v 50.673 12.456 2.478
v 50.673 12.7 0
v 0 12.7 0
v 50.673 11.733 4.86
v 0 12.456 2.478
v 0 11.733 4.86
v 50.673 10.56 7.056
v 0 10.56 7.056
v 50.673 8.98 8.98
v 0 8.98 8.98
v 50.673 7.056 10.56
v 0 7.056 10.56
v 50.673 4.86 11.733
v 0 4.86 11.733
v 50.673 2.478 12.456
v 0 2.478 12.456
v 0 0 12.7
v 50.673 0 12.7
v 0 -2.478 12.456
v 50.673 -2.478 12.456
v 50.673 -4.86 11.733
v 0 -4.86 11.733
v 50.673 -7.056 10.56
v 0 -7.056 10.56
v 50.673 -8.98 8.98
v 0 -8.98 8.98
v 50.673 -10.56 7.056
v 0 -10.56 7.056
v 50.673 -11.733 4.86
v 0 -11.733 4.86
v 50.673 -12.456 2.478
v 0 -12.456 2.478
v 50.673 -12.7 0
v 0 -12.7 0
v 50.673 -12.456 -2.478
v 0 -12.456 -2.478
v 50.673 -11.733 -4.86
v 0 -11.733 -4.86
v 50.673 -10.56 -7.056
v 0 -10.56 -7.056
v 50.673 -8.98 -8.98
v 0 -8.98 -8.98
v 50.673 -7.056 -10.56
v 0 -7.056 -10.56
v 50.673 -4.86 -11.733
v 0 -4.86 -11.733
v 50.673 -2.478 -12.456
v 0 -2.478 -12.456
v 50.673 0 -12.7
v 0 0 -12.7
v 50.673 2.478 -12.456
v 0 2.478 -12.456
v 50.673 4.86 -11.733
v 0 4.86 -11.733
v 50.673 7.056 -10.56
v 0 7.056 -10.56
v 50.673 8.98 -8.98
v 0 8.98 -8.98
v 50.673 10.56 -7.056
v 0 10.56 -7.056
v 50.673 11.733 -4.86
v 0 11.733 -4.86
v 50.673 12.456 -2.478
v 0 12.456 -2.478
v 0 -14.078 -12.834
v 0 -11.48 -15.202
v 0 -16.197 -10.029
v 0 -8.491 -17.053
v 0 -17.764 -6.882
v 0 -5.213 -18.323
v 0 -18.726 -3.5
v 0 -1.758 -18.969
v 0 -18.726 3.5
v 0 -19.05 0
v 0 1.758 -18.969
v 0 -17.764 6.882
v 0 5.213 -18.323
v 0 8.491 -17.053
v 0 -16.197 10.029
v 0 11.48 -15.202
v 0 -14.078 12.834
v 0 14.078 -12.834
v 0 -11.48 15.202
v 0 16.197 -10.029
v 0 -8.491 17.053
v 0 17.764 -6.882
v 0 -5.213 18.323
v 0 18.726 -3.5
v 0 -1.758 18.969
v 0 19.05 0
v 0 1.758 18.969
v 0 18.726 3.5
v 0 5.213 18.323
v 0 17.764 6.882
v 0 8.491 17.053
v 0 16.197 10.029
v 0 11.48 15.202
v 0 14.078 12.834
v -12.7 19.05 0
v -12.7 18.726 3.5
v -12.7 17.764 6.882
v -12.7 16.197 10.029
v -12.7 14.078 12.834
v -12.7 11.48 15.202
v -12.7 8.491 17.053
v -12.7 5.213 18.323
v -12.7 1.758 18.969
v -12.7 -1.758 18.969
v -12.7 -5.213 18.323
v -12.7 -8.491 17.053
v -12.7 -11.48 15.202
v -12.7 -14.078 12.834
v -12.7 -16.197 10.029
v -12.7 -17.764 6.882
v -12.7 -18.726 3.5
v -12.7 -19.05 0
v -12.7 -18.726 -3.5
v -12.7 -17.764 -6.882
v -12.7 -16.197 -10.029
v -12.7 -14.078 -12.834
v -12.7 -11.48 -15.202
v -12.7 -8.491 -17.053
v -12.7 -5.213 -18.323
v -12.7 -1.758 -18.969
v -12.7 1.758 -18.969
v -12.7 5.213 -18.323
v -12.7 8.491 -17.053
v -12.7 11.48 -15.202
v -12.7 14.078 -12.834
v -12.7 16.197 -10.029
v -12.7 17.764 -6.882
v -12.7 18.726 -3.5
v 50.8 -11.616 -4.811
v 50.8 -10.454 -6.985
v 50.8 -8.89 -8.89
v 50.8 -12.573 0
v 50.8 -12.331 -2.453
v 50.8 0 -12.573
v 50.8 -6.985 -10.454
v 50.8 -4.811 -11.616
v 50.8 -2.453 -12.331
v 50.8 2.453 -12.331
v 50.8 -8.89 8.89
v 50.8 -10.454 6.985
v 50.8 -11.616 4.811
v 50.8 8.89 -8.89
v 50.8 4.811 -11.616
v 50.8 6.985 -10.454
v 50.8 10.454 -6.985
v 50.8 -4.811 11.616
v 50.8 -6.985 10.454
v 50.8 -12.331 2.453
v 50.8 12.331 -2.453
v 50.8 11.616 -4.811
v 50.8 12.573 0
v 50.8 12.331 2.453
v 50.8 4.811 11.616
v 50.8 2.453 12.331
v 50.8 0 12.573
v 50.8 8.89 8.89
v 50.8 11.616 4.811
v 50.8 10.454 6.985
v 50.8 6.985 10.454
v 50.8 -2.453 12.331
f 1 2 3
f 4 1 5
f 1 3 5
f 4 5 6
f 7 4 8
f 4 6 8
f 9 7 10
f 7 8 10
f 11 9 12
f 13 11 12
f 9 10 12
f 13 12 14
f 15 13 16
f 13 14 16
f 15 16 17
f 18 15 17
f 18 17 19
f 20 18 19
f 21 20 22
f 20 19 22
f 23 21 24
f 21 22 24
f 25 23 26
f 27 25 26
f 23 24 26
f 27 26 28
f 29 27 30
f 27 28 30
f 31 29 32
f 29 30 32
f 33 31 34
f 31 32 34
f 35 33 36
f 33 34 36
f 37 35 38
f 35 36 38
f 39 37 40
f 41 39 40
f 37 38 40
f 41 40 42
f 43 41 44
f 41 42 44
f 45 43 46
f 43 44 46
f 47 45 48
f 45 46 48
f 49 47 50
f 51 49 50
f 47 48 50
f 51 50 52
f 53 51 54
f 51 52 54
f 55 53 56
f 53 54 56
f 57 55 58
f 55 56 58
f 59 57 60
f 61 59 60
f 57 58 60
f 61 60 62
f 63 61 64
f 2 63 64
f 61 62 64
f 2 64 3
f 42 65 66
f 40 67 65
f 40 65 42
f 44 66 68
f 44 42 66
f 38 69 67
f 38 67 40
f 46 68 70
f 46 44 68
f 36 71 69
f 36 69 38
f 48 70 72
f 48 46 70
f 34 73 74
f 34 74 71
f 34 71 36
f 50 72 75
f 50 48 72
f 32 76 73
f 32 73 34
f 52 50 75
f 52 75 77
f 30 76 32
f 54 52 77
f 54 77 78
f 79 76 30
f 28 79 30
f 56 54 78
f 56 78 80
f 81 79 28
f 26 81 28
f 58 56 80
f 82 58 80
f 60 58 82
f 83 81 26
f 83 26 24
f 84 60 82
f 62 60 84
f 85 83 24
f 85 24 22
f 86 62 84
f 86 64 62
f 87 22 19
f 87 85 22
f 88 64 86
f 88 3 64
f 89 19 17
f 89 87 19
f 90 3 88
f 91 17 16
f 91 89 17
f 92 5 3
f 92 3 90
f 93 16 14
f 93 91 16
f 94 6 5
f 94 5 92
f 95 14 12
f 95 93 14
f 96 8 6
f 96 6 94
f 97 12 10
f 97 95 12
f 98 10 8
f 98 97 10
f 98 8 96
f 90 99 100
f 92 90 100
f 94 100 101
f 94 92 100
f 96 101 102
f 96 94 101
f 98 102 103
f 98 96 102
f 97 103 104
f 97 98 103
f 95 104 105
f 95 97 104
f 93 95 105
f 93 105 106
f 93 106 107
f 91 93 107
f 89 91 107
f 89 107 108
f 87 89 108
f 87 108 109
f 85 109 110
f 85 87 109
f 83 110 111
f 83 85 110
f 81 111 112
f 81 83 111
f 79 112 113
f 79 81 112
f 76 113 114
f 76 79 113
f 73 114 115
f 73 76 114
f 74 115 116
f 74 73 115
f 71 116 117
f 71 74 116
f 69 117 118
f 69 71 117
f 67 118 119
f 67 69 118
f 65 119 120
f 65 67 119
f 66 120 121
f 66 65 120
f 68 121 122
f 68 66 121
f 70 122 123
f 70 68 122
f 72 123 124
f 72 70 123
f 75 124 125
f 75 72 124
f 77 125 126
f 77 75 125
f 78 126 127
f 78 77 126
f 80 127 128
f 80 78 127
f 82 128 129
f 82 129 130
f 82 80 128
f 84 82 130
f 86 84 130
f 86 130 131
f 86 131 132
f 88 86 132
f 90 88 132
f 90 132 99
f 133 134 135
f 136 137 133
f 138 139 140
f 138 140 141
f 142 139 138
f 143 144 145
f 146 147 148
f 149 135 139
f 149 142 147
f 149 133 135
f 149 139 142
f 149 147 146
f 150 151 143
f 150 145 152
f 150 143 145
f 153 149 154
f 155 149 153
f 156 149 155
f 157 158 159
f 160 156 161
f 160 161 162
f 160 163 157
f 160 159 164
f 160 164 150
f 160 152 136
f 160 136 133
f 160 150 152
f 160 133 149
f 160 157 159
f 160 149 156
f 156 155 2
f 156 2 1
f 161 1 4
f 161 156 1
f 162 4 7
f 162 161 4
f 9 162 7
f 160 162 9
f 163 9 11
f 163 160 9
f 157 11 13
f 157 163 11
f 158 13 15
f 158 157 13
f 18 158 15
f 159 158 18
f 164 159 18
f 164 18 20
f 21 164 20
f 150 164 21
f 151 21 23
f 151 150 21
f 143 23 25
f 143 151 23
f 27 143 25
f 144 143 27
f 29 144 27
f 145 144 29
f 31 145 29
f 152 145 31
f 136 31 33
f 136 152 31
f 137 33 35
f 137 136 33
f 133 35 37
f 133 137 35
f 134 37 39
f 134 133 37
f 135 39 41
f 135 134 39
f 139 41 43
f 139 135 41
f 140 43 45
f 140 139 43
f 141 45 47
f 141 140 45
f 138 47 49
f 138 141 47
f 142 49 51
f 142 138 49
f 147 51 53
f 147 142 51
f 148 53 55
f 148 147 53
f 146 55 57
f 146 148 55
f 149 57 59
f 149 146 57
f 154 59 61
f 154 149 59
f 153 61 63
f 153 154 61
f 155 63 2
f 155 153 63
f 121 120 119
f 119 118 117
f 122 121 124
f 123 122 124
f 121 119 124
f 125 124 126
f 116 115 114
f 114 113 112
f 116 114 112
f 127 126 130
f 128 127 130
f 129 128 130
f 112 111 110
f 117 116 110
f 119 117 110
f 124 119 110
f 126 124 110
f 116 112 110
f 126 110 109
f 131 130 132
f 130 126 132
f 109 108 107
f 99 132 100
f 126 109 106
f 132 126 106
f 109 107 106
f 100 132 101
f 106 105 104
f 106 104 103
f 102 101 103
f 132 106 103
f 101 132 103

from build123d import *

# Parameters (mm, degrees)
F0_R     = 19.05
F1_DEPTH = 12.7
F2_R     = 12.7
F3_DEPTH = 50.8
F4_SIZE  = 0.127


with BuildPart() as f1:
    # F0 (on Right) → F1 (new body)
    with BuildSketch(Plane.YZ):
        Circle(F0_R)
    extrude(amount=-F1_DEPTH)

    # F2 (on face) → F3 (join)
    with BuildSketch(Plane.YZ):
        Circle(F2_R)
    extrude(amount=F3_DEPTH)

    # F4
    f4_edges = [f1.edges().sort_by_distance(p)[0] for p in [
        (50.8, -12.7, 0),
    ]]
    chamfer(f4_edges, length=F4_SIZE)


solid = f1.part
